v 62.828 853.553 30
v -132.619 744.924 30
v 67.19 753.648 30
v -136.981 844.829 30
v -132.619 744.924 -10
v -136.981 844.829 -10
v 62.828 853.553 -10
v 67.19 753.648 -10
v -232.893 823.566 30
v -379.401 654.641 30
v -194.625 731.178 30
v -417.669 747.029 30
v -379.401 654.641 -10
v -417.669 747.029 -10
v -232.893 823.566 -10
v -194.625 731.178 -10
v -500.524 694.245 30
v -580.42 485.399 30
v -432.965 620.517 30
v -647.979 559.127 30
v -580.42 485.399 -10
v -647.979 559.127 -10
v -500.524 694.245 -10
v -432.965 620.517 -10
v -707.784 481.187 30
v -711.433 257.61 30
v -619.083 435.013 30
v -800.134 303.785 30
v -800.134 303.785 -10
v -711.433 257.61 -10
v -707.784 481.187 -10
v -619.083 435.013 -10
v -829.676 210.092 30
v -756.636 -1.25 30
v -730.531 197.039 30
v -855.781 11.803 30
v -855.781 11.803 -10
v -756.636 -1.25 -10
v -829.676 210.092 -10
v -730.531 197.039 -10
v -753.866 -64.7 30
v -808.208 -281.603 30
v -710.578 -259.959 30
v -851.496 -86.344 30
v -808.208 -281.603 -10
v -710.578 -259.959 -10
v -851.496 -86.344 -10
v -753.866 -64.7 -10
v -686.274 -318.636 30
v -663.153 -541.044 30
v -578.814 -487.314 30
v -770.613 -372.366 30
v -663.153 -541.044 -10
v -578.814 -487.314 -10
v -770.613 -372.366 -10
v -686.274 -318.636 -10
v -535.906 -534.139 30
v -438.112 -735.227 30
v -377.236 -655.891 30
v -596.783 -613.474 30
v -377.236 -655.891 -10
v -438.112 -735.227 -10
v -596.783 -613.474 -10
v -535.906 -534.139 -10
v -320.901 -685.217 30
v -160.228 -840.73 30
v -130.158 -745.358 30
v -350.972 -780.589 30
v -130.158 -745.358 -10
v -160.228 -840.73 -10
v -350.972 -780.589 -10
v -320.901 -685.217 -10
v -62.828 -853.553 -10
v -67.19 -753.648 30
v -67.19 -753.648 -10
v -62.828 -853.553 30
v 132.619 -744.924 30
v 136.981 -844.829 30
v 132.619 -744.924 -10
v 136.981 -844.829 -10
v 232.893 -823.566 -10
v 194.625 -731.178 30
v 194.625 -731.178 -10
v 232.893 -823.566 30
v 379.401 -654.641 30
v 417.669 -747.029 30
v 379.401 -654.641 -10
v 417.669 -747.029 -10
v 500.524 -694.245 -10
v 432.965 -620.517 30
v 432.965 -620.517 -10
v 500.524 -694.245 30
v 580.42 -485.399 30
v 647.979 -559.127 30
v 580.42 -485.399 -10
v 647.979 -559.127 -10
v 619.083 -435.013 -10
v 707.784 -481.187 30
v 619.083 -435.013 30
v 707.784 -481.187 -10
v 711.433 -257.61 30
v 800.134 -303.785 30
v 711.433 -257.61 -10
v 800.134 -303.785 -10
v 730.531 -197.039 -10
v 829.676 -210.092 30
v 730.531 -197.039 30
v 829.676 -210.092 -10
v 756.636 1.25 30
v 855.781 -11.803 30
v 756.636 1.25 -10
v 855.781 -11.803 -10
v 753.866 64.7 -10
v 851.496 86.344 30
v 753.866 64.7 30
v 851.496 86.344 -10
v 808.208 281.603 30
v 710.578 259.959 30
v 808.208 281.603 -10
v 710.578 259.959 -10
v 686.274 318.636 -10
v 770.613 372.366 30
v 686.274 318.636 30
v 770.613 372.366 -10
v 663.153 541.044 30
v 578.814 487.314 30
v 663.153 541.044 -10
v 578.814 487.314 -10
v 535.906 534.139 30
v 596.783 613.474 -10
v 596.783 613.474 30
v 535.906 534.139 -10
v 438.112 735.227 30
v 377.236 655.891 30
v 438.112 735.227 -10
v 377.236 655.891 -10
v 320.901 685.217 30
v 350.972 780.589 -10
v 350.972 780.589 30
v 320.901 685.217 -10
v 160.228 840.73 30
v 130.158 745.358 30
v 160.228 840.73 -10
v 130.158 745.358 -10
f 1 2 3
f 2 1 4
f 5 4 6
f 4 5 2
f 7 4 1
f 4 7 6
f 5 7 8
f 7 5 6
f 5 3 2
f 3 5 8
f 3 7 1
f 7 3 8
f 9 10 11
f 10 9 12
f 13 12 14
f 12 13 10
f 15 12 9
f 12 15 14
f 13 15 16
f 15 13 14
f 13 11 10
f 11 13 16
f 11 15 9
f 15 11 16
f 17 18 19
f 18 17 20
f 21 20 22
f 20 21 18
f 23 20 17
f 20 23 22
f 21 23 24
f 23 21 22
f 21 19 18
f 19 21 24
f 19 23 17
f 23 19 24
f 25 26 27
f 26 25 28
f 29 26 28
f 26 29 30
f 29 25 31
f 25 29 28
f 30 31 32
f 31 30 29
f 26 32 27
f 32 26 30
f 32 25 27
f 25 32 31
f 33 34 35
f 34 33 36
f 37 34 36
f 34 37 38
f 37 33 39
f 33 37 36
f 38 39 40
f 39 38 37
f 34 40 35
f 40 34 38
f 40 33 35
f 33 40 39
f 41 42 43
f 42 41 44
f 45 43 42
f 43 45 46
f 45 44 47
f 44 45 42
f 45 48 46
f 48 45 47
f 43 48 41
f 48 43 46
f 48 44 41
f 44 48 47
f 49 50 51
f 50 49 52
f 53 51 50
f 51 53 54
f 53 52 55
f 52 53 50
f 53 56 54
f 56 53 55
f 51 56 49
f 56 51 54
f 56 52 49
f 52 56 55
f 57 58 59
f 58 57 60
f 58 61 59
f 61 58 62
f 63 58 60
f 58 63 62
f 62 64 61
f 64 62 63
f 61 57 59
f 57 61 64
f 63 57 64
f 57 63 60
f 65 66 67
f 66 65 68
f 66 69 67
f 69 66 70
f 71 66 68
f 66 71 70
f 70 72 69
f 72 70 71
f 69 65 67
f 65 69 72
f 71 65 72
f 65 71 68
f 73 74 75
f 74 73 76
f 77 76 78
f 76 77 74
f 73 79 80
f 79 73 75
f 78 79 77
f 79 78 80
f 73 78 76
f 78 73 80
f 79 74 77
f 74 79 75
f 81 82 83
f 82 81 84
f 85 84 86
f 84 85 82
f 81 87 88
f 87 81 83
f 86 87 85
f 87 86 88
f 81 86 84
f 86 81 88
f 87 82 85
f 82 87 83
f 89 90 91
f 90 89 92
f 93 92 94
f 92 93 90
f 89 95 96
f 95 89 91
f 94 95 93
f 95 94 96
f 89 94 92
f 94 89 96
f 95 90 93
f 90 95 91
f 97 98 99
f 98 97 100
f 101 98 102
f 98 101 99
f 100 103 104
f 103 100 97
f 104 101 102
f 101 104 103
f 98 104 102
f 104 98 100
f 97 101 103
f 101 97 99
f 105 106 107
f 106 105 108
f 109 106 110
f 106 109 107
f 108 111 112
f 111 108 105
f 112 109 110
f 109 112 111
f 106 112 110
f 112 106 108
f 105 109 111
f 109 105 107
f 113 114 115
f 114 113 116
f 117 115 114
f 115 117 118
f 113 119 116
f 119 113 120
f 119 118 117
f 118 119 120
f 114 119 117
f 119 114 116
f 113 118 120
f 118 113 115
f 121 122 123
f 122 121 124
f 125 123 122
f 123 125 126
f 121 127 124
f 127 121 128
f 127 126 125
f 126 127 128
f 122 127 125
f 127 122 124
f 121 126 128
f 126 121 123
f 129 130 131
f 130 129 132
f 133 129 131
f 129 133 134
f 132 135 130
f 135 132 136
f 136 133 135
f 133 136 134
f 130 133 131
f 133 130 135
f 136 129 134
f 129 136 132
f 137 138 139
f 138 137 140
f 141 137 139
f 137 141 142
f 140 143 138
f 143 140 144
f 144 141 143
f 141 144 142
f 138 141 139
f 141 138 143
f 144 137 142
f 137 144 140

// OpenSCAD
cir=800;
module q(){
cube([200,100,40],center=true);
}
h=10;
//for(h=[0:40:400]){
for(i=[0:20:360]){

rotate([0,0,i+h/4])
translate([0,cir,h])
  q();
  }
//}
